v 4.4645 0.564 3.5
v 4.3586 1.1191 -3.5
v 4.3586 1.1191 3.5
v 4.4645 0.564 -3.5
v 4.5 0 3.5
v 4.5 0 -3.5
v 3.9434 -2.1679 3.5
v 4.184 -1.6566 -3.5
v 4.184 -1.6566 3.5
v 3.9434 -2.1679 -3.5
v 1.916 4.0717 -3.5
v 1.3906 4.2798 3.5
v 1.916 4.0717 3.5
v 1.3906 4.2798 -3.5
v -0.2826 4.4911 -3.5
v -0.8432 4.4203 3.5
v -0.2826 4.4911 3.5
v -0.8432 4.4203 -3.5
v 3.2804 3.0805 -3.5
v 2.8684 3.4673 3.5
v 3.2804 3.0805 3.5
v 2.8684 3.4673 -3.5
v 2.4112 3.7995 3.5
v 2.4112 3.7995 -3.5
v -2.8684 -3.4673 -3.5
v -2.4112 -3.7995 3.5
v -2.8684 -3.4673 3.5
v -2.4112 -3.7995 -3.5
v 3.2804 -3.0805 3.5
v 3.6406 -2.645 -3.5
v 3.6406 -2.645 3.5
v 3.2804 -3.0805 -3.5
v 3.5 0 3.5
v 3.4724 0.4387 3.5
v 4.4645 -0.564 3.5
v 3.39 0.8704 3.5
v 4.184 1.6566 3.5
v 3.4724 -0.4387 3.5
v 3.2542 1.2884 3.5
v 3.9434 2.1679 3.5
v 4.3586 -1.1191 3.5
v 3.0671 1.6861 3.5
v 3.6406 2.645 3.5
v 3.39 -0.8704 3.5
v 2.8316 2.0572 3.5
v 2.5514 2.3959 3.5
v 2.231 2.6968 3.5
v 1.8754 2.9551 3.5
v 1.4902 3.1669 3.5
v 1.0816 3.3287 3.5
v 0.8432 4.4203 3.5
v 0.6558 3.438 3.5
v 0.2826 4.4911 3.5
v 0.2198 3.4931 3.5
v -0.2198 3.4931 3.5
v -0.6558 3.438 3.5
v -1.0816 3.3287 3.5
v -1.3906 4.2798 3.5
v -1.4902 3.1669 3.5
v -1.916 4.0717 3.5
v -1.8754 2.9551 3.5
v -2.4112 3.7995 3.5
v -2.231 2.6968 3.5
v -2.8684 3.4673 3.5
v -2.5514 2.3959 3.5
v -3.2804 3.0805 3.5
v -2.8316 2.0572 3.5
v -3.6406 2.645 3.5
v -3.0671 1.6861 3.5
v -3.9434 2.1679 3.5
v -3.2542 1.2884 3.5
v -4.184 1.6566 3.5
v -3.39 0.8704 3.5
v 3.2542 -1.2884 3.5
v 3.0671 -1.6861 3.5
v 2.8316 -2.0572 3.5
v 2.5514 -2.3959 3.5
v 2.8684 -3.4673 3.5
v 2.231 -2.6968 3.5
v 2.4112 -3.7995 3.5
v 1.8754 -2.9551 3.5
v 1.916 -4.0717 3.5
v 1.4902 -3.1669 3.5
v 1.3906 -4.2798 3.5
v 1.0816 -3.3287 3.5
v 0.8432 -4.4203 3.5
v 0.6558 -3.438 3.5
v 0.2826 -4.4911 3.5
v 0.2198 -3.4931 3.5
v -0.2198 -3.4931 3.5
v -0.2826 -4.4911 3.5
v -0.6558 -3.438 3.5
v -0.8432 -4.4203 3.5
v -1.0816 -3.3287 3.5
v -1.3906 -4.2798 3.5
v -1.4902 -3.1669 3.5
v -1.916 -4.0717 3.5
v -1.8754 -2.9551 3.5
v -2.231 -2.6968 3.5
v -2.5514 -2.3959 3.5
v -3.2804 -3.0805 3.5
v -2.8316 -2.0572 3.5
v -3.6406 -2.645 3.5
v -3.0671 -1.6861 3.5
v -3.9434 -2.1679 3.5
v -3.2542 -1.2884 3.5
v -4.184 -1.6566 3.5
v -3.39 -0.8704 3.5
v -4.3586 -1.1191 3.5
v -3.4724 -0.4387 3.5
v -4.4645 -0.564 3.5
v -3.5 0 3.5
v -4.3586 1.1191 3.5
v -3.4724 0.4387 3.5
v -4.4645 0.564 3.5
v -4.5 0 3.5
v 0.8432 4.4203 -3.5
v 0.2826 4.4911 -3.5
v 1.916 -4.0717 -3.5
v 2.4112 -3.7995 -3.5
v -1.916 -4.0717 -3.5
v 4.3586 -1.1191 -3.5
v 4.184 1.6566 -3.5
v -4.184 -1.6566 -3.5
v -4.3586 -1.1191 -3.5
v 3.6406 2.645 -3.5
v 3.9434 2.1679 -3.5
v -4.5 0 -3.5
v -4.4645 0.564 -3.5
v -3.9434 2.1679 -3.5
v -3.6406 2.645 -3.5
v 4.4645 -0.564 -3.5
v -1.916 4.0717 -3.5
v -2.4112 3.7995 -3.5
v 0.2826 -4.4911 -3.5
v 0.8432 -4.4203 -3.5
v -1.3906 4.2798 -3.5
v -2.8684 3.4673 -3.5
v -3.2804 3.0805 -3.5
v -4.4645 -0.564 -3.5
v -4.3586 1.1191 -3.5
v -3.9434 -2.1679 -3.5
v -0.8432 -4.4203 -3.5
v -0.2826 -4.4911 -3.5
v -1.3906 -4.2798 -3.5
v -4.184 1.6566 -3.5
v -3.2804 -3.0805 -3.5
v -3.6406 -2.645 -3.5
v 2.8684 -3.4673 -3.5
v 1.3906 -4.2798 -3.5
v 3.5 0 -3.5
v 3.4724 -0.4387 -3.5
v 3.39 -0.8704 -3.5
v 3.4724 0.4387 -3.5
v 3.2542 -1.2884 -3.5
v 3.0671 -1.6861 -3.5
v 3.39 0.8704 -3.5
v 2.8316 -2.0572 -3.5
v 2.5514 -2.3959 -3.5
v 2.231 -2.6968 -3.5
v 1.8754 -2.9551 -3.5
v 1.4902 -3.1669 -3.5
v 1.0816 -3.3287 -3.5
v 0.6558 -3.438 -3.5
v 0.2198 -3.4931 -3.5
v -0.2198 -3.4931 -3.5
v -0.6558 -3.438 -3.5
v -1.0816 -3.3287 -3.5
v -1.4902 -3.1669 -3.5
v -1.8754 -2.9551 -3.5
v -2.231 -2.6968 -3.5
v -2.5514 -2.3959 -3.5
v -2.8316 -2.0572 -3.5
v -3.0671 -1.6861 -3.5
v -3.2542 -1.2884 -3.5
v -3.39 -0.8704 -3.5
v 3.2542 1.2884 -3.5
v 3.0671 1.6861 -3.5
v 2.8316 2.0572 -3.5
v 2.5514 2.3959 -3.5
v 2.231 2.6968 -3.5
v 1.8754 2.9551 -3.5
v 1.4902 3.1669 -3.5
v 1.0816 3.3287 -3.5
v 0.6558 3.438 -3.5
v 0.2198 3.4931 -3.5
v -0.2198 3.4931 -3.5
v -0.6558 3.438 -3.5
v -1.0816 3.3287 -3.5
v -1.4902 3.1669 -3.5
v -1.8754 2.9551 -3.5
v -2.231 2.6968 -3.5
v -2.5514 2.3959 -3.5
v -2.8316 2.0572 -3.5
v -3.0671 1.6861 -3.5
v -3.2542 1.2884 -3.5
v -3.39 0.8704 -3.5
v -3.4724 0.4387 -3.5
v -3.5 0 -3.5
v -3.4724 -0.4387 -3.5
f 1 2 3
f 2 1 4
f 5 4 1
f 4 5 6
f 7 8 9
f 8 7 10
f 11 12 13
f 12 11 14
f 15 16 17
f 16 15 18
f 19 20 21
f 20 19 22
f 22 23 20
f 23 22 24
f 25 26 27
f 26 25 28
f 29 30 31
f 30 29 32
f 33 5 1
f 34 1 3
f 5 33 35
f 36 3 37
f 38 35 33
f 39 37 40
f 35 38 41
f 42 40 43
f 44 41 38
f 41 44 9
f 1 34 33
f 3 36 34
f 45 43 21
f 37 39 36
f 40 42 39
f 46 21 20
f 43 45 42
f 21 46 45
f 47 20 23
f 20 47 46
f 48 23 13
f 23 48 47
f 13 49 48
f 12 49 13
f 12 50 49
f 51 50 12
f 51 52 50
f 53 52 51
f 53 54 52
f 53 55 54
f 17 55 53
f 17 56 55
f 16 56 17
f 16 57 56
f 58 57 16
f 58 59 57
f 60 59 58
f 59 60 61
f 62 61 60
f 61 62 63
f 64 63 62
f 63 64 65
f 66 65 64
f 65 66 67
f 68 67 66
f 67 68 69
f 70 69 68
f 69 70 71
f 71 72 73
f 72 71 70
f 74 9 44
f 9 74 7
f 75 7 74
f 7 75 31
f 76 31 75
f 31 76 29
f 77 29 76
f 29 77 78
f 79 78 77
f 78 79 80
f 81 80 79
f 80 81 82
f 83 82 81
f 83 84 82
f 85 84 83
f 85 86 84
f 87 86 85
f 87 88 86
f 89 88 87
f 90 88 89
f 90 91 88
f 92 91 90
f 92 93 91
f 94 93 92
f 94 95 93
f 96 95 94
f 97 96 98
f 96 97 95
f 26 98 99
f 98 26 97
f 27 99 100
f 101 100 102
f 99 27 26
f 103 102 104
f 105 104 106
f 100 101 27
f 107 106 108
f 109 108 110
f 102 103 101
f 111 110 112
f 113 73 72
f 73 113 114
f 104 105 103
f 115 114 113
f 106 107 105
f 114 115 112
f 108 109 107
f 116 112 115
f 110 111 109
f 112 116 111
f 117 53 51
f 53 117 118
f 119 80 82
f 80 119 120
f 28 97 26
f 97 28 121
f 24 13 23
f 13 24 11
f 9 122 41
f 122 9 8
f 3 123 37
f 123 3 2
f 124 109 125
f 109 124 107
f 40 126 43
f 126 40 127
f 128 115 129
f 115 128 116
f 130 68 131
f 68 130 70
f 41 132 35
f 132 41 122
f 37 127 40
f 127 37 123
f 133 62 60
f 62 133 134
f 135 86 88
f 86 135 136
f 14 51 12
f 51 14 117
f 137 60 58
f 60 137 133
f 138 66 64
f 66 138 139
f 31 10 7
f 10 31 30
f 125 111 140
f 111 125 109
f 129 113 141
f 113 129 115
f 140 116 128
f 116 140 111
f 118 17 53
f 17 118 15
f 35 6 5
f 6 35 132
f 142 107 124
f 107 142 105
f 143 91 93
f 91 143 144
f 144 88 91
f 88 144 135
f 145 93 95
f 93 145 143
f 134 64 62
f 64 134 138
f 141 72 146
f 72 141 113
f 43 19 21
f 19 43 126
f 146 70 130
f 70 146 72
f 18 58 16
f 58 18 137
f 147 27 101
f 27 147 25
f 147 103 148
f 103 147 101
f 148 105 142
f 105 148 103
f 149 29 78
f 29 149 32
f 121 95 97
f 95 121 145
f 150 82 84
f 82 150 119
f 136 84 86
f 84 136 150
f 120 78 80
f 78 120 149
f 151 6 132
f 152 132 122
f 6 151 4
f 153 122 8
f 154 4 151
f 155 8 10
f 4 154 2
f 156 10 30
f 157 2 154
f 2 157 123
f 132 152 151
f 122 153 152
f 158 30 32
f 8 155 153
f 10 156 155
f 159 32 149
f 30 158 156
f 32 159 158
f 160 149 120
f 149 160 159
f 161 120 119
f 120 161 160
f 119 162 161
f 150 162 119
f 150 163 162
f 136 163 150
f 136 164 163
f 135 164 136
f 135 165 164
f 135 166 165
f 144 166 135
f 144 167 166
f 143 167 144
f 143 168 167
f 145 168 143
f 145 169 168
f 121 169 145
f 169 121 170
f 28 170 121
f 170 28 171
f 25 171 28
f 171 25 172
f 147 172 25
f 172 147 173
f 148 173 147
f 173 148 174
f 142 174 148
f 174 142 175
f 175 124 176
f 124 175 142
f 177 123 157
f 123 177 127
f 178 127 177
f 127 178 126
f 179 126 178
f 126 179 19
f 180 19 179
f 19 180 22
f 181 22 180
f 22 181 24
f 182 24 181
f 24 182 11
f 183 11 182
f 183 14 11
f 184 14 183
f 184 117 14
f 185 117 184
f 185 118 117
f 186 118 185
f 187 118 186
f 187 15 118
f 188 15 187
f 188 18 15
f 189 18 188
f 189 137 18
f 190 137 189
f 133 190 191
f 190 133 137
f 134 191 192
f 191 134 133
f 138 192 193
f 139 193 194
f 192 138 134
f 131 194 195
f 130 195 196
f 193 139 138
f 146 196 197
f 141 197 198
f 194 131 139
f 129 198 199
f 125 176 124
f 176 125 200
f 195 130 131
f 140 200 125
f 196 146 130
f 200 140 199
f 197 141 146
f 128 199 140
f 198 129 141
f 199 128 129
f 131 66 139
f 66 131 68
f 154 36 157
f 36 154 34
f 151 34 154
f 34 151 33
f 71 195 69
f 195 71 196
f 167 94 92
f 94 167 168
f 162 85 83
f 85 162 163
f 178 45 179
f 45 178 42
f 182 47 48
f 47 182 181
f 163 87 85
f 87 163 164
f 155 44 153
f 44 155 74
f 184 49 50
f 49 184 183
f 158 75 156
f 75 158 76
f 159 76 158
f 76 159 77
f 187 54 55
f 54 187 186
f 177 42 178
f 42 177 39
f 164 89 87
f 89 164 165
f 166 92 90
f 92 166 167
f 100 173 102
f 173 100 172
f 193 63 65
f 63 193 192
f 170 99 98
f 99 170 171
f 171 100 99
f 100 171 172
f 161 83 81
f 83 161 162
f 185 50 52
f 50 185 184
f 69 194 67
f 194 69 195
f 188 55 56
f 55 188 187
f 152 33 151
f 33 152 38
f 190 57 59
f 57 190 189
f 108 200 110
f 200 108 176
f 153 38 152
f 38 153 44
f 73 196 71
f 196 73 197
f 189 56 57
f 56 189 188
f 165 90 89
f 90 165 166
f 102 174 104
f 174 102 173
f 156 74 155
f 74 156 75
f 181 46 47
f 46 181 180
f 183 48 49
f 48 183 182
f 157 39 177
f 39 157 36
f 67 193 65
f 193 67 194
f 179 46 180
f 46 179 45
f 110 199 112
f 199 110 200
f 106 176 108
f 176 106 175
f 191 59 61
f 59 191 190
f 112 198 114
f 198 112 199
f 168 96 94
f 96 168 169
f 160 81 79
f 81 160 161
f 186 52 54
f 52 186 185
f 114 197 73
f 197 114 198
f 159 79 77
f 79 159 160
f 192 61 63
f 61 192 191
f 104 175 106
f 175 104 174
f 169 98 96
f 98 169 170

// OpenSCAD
$fn = 50;


difference() {
	union() {
		translate(v = [0, 0, -3.5000000000]) {
			cylinder(h = 7, r = 4.5000000000);
		}
	}
	union() {
		translate(v = [0, 0, -100.0000000000]) {
			cylinder(h = 200, r = 3.5000000000);
		}
	}
}
